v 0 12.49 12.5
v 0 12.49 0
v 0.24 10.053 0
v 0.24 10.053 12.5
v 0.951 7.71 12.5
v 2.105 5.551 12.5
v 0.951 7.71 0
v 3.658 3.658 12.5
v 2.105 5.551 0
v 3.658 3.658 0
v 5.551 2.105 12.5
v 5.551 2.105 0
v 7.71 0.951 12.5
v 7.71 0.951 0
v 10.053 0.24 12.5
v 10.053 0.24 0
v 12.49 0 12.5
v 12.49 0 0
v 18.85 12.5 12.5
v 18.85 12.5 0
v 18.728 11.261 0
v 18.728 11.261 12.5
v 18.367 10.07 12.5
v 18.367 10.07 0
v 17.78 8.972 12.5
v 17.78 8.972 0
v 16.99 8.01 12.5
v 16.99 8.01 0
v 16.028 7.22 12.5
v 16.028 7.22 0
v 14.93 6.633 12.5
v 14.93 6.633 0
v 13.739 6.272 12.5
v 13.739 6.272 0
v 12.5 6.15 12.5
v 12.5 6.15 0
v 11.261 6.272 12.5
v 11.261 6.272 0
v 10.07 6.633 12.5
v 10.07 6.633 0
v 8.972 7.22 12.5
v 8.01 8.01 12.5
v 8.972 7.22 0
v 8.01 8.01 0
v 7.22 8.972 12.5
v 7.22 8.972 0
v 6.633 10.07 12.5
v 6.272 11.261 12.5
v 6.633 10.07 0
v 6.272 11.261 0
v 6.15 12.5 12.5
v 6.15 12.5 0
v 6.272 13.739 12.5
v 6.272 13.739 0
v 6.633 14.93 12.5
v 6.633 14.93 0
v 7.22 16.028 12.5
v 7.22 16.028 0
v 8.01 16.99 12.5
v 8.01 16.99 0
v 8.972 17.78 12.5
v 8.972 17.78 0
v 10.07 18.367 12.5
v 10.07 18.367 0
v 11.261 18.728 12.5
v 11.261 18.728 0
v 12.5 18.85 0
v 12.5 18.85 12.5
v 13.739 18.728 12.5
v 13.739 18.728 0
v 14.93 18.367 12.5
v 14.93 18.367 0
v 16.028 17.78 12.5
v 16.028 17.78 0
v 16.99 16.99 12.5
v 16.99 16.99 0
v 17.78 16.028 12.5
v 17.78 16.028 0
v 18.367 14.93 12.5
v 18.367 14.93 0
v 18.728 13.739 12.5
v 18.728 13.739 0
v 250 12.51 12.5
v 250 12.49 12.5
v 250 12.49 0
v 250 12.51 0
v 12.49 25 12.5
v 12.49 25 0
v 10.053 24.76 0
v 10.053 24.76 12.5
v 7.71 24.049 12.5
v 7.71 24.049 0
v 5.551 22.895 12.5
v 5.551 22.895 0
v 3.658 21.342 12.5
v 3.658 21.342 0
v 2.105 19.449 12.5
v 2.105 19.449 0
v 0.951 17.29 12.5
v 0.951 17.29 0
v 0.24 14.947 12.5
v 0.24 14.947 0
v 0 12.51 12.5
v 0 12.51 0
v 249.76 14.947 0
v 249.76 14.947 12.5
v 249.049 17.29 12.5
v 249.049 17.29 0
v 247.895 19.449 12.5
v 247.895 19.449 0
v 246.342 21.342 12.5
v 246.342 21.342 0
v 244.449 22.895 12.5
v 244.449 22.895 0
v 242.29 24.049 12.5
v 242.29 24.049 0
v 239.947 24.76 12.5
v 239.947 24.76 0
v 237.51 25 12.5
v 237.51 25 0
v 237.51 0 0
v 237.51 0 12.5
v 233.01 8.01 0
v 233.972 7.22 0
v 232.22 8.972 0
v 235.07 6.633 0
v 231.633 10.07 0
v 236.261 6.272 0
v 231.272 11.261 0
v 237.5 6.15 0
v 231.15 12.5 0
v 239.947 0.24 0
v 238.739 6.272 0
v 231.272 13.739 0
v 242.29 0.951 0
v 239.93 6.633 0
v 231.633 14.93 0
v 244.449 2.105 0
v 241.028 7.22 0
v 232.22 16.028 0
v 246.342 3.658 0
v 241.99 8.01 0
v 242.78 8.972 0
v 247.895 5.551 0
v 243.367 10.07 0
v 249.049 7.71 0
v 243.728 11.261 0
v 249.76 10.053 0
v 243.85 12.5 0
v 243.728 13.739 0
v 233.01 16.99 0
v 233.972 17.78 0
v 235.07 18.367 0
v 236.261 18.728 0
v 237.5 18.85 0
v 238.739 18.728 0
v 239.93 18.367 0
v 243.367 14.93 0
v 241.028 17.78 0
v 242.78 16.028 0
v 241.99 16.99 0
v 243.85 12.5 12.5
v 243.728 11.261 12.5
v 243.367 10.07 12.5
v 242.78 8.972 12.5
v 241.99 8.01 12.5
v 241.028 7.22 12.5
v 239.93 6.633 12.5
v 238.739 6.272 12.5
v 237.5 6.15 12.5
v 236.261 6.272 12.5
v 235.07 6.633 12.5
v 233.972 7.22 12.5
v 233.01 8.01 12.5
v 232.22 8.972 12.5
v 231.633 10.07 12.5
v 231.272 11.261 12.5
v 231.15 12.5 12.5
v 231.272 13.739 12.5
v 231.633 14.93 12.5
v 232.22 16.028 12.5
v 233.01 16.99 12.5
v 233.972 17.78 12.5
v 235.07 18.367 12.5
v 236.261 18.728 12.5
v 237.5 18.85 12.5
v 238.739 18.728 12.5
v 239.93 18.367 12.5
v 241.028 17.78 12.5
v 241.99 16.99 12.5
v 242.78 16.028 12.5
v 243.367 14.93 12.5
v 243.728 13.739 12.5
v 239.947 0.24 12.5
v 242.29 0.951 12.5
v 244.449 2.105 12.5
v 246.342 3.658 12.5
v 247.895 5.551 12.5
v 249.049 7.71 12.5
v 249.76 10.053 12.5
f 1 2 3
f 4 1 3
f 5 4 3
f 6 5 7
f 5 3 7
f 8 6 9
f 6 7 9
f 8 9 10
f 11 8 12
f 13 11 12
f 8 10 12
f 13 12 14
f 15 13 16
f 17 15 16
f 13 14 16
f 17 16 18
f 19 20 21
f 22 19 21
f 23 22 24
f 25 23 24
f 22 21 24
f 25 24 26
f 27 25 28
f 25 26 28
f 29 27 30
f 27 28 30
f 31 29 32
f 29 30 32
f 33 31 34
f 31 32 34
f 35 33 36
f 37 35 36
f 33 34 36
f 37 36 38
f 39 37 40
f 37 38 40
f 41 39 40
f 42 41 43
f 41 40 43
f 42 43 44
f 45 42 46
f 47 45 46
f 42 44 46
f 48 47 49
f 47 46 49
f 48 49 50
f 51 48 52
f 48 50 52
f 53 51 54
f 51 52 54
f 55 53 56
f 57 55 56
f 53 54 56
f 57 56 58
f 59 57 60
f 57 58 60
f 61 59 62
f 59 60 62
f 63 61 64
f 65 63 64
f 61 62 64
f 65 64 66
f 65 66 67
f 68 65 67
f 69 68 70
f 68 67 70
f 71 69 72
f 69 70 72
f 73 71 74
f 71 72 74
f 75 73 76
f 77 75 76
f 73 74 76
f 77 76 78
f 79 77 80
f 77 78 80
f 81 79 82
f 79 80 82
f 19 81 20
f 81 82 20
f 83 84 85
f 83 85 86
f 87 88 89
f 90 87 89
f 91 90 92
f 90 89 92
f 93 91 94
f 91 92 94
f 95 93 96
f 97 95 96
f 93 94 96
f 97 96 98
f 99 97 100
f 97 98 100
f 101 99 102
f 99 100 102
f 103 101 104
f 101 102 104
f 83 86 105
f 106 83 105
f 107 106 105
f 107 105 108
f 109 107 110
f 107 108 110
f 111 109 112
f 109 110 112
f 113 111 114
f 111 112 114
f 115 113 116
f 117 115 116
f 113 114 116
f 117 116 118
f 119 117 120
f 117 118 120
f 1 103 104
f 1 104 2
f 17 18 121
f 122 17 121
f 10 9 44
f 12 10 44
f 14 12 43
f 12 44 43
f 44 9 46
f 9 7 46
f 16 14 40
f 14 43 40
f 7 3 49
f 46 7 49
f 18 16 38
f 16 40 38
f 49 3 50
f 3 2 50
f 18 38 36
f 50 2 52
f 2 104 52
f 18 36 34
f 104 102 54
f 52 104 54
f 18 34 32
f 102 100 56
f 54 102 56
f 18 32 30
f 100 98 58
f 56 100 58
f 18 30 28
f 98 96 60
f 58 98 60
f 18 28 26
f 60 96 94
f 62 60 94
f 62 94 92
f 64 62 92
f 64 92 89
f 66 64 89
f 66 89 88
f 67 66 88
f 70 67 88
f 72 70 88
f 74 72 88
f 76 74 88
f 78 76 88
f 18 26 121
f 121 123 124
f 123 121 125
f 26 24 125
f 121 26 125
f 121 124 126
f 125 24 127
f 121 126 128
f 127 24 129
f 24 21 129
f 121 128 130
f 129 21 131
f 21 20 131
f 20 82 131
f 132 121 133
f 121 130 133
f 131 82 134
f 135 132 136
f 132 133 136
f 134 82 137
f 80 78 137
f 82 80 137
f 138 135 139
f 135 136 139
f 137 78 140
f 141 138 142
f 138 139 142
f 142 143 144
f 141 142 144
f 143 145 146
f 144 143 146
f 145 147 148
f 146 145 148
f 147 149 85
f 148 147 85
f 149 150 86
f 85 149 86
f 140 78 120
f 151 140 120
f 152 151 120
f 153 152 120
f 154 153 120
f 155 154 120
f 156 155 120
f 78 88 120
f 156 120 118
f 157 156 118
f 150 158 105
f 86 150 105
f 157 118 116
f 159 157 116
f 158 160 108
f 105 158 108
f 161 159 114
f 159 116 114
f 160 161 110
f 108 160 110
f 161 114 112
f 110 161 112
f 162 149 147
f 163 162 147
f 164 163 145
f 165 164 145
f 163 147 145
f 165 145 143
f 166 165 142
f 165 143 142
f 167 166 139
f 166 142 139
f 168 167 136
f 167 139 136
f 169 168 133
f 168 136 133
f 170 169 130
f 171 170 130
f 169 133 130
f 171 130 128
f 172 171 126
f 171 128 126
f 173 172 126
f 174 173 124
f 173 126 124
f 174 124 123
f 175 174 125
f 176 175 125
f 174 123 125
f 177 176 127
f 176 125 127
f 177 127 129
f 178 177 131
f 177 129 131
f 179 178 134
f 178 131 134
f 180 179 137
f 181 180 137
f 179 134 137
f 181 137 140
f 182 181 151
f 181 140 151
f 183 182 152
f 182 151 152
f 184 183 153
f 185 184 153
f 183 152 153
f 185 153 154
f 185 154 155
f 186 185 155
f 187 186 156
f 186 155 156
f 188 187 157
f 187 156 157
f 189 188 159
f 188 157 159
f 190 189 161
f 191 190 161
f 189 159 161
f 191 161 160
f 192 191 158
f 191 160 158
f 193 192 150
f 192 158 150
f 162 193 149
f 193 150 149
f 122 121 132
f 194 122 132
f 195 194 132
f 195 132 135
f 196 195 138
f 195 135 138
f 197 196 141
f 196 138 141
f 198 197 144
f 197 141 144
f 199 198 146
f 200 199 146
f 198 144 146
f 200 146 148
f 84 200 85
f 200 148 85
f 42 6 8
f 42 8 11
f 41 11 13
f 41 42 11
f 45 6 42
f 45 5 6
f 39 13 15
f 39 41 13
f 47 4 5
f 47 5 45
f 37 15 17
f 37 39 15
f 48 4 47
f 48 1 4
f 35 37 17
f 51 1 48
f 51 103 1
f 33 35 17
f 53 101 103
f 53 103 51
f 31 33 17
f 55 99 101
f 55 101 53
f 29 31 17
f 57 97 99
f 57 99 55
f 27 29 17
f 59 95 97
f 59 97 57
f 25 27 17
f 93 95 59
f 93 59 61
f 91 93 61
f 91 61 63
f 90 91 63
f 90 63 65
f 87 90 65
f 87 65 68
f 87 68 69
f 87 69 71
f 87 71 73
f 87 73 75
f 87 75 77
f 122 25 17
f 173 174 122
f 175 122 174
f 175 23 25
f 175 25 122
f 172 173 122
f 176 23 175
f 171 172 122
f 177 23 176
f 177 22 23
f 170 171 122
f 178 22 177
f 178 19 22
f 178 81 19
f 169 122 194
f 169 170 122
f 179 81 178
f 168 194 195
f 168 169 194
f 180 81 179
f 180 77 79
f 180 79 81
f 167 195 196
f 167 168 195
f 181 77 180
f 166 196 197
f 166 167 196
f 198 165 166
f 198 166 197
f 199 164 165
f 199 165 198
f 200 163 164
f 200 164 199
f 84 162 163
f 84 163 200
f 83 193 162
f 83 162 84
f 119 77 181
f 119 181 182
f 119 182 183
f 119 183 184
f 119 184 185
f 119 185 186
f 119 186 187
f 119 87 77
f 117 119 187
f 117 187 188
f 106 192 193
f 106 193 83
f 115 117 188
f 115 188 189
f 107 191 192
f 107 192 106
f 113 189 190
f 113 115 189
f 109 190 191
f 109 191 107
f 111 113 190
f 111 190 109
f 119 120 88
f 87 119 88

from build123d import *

# Parameters (mm, degrees)
BOSS_EXTRUDE1_DEPTH = 12.5


with BuildPart() as part:
    # Sketch1 → Boss-Extrude1 (new body)
    with BuildSketch(Plane.XY):
        with BuildLine():
            ThreePointArc((231.15, 12.5), (237.5, 18.85), (243.85, 12.5))
            Line((243.85, 12.5), (250, 12.5))
            Line((250, 12.5), (250, 12.51))
            ThreePointArc((250, 12.51), (246.341763697, 21.341763697), (237.51, 25))
            Line((237.51, 25), (12.49, 25))
            ThreePointArc((12.49, 25), (3.658236303, 21.341763697), (0, 12.51))
            Line((0, 12.51), (0, 12.5))
            Line((0, 12.5), (6.15, 12.5))
            ThreePointArc((6.15, 12.5), (12.5, 18.85), (18.85, 12.5))
            Line((18.85, 12.5), (231.15, 12.5))
        make_face()
        with BuildLine():
            Line((250, 12.5), (243.85, 12.5))
            ThreePointArc((243.85, 12.5), (237.5, 6.15), (231.15, 12.5))
            Line((231.15, 12.5), (18.85, 12.5))
            ThreePointArc((18.85, 12.5), (12.5, 6.15), (6.15, 12.5))
            Line((6.15, 12.5), (0, 12.5))
            Line((0, 12.5), (0, 12.49))
            ThreePointArc((0, 12.49), (3.658236303, 3.658236303), (12.49, 0))
            Line((12.49, 0), (237.51, 0))
            ThreePointArc((237.51, 0), (246.341763697, 3.658236303), (250, 12.49))
            Line((250, 12.49), (250, 12.5))
        make_face()
    extrude(amount=BOSS_EXTRUDE1_DEPTH)


solid = part.part
